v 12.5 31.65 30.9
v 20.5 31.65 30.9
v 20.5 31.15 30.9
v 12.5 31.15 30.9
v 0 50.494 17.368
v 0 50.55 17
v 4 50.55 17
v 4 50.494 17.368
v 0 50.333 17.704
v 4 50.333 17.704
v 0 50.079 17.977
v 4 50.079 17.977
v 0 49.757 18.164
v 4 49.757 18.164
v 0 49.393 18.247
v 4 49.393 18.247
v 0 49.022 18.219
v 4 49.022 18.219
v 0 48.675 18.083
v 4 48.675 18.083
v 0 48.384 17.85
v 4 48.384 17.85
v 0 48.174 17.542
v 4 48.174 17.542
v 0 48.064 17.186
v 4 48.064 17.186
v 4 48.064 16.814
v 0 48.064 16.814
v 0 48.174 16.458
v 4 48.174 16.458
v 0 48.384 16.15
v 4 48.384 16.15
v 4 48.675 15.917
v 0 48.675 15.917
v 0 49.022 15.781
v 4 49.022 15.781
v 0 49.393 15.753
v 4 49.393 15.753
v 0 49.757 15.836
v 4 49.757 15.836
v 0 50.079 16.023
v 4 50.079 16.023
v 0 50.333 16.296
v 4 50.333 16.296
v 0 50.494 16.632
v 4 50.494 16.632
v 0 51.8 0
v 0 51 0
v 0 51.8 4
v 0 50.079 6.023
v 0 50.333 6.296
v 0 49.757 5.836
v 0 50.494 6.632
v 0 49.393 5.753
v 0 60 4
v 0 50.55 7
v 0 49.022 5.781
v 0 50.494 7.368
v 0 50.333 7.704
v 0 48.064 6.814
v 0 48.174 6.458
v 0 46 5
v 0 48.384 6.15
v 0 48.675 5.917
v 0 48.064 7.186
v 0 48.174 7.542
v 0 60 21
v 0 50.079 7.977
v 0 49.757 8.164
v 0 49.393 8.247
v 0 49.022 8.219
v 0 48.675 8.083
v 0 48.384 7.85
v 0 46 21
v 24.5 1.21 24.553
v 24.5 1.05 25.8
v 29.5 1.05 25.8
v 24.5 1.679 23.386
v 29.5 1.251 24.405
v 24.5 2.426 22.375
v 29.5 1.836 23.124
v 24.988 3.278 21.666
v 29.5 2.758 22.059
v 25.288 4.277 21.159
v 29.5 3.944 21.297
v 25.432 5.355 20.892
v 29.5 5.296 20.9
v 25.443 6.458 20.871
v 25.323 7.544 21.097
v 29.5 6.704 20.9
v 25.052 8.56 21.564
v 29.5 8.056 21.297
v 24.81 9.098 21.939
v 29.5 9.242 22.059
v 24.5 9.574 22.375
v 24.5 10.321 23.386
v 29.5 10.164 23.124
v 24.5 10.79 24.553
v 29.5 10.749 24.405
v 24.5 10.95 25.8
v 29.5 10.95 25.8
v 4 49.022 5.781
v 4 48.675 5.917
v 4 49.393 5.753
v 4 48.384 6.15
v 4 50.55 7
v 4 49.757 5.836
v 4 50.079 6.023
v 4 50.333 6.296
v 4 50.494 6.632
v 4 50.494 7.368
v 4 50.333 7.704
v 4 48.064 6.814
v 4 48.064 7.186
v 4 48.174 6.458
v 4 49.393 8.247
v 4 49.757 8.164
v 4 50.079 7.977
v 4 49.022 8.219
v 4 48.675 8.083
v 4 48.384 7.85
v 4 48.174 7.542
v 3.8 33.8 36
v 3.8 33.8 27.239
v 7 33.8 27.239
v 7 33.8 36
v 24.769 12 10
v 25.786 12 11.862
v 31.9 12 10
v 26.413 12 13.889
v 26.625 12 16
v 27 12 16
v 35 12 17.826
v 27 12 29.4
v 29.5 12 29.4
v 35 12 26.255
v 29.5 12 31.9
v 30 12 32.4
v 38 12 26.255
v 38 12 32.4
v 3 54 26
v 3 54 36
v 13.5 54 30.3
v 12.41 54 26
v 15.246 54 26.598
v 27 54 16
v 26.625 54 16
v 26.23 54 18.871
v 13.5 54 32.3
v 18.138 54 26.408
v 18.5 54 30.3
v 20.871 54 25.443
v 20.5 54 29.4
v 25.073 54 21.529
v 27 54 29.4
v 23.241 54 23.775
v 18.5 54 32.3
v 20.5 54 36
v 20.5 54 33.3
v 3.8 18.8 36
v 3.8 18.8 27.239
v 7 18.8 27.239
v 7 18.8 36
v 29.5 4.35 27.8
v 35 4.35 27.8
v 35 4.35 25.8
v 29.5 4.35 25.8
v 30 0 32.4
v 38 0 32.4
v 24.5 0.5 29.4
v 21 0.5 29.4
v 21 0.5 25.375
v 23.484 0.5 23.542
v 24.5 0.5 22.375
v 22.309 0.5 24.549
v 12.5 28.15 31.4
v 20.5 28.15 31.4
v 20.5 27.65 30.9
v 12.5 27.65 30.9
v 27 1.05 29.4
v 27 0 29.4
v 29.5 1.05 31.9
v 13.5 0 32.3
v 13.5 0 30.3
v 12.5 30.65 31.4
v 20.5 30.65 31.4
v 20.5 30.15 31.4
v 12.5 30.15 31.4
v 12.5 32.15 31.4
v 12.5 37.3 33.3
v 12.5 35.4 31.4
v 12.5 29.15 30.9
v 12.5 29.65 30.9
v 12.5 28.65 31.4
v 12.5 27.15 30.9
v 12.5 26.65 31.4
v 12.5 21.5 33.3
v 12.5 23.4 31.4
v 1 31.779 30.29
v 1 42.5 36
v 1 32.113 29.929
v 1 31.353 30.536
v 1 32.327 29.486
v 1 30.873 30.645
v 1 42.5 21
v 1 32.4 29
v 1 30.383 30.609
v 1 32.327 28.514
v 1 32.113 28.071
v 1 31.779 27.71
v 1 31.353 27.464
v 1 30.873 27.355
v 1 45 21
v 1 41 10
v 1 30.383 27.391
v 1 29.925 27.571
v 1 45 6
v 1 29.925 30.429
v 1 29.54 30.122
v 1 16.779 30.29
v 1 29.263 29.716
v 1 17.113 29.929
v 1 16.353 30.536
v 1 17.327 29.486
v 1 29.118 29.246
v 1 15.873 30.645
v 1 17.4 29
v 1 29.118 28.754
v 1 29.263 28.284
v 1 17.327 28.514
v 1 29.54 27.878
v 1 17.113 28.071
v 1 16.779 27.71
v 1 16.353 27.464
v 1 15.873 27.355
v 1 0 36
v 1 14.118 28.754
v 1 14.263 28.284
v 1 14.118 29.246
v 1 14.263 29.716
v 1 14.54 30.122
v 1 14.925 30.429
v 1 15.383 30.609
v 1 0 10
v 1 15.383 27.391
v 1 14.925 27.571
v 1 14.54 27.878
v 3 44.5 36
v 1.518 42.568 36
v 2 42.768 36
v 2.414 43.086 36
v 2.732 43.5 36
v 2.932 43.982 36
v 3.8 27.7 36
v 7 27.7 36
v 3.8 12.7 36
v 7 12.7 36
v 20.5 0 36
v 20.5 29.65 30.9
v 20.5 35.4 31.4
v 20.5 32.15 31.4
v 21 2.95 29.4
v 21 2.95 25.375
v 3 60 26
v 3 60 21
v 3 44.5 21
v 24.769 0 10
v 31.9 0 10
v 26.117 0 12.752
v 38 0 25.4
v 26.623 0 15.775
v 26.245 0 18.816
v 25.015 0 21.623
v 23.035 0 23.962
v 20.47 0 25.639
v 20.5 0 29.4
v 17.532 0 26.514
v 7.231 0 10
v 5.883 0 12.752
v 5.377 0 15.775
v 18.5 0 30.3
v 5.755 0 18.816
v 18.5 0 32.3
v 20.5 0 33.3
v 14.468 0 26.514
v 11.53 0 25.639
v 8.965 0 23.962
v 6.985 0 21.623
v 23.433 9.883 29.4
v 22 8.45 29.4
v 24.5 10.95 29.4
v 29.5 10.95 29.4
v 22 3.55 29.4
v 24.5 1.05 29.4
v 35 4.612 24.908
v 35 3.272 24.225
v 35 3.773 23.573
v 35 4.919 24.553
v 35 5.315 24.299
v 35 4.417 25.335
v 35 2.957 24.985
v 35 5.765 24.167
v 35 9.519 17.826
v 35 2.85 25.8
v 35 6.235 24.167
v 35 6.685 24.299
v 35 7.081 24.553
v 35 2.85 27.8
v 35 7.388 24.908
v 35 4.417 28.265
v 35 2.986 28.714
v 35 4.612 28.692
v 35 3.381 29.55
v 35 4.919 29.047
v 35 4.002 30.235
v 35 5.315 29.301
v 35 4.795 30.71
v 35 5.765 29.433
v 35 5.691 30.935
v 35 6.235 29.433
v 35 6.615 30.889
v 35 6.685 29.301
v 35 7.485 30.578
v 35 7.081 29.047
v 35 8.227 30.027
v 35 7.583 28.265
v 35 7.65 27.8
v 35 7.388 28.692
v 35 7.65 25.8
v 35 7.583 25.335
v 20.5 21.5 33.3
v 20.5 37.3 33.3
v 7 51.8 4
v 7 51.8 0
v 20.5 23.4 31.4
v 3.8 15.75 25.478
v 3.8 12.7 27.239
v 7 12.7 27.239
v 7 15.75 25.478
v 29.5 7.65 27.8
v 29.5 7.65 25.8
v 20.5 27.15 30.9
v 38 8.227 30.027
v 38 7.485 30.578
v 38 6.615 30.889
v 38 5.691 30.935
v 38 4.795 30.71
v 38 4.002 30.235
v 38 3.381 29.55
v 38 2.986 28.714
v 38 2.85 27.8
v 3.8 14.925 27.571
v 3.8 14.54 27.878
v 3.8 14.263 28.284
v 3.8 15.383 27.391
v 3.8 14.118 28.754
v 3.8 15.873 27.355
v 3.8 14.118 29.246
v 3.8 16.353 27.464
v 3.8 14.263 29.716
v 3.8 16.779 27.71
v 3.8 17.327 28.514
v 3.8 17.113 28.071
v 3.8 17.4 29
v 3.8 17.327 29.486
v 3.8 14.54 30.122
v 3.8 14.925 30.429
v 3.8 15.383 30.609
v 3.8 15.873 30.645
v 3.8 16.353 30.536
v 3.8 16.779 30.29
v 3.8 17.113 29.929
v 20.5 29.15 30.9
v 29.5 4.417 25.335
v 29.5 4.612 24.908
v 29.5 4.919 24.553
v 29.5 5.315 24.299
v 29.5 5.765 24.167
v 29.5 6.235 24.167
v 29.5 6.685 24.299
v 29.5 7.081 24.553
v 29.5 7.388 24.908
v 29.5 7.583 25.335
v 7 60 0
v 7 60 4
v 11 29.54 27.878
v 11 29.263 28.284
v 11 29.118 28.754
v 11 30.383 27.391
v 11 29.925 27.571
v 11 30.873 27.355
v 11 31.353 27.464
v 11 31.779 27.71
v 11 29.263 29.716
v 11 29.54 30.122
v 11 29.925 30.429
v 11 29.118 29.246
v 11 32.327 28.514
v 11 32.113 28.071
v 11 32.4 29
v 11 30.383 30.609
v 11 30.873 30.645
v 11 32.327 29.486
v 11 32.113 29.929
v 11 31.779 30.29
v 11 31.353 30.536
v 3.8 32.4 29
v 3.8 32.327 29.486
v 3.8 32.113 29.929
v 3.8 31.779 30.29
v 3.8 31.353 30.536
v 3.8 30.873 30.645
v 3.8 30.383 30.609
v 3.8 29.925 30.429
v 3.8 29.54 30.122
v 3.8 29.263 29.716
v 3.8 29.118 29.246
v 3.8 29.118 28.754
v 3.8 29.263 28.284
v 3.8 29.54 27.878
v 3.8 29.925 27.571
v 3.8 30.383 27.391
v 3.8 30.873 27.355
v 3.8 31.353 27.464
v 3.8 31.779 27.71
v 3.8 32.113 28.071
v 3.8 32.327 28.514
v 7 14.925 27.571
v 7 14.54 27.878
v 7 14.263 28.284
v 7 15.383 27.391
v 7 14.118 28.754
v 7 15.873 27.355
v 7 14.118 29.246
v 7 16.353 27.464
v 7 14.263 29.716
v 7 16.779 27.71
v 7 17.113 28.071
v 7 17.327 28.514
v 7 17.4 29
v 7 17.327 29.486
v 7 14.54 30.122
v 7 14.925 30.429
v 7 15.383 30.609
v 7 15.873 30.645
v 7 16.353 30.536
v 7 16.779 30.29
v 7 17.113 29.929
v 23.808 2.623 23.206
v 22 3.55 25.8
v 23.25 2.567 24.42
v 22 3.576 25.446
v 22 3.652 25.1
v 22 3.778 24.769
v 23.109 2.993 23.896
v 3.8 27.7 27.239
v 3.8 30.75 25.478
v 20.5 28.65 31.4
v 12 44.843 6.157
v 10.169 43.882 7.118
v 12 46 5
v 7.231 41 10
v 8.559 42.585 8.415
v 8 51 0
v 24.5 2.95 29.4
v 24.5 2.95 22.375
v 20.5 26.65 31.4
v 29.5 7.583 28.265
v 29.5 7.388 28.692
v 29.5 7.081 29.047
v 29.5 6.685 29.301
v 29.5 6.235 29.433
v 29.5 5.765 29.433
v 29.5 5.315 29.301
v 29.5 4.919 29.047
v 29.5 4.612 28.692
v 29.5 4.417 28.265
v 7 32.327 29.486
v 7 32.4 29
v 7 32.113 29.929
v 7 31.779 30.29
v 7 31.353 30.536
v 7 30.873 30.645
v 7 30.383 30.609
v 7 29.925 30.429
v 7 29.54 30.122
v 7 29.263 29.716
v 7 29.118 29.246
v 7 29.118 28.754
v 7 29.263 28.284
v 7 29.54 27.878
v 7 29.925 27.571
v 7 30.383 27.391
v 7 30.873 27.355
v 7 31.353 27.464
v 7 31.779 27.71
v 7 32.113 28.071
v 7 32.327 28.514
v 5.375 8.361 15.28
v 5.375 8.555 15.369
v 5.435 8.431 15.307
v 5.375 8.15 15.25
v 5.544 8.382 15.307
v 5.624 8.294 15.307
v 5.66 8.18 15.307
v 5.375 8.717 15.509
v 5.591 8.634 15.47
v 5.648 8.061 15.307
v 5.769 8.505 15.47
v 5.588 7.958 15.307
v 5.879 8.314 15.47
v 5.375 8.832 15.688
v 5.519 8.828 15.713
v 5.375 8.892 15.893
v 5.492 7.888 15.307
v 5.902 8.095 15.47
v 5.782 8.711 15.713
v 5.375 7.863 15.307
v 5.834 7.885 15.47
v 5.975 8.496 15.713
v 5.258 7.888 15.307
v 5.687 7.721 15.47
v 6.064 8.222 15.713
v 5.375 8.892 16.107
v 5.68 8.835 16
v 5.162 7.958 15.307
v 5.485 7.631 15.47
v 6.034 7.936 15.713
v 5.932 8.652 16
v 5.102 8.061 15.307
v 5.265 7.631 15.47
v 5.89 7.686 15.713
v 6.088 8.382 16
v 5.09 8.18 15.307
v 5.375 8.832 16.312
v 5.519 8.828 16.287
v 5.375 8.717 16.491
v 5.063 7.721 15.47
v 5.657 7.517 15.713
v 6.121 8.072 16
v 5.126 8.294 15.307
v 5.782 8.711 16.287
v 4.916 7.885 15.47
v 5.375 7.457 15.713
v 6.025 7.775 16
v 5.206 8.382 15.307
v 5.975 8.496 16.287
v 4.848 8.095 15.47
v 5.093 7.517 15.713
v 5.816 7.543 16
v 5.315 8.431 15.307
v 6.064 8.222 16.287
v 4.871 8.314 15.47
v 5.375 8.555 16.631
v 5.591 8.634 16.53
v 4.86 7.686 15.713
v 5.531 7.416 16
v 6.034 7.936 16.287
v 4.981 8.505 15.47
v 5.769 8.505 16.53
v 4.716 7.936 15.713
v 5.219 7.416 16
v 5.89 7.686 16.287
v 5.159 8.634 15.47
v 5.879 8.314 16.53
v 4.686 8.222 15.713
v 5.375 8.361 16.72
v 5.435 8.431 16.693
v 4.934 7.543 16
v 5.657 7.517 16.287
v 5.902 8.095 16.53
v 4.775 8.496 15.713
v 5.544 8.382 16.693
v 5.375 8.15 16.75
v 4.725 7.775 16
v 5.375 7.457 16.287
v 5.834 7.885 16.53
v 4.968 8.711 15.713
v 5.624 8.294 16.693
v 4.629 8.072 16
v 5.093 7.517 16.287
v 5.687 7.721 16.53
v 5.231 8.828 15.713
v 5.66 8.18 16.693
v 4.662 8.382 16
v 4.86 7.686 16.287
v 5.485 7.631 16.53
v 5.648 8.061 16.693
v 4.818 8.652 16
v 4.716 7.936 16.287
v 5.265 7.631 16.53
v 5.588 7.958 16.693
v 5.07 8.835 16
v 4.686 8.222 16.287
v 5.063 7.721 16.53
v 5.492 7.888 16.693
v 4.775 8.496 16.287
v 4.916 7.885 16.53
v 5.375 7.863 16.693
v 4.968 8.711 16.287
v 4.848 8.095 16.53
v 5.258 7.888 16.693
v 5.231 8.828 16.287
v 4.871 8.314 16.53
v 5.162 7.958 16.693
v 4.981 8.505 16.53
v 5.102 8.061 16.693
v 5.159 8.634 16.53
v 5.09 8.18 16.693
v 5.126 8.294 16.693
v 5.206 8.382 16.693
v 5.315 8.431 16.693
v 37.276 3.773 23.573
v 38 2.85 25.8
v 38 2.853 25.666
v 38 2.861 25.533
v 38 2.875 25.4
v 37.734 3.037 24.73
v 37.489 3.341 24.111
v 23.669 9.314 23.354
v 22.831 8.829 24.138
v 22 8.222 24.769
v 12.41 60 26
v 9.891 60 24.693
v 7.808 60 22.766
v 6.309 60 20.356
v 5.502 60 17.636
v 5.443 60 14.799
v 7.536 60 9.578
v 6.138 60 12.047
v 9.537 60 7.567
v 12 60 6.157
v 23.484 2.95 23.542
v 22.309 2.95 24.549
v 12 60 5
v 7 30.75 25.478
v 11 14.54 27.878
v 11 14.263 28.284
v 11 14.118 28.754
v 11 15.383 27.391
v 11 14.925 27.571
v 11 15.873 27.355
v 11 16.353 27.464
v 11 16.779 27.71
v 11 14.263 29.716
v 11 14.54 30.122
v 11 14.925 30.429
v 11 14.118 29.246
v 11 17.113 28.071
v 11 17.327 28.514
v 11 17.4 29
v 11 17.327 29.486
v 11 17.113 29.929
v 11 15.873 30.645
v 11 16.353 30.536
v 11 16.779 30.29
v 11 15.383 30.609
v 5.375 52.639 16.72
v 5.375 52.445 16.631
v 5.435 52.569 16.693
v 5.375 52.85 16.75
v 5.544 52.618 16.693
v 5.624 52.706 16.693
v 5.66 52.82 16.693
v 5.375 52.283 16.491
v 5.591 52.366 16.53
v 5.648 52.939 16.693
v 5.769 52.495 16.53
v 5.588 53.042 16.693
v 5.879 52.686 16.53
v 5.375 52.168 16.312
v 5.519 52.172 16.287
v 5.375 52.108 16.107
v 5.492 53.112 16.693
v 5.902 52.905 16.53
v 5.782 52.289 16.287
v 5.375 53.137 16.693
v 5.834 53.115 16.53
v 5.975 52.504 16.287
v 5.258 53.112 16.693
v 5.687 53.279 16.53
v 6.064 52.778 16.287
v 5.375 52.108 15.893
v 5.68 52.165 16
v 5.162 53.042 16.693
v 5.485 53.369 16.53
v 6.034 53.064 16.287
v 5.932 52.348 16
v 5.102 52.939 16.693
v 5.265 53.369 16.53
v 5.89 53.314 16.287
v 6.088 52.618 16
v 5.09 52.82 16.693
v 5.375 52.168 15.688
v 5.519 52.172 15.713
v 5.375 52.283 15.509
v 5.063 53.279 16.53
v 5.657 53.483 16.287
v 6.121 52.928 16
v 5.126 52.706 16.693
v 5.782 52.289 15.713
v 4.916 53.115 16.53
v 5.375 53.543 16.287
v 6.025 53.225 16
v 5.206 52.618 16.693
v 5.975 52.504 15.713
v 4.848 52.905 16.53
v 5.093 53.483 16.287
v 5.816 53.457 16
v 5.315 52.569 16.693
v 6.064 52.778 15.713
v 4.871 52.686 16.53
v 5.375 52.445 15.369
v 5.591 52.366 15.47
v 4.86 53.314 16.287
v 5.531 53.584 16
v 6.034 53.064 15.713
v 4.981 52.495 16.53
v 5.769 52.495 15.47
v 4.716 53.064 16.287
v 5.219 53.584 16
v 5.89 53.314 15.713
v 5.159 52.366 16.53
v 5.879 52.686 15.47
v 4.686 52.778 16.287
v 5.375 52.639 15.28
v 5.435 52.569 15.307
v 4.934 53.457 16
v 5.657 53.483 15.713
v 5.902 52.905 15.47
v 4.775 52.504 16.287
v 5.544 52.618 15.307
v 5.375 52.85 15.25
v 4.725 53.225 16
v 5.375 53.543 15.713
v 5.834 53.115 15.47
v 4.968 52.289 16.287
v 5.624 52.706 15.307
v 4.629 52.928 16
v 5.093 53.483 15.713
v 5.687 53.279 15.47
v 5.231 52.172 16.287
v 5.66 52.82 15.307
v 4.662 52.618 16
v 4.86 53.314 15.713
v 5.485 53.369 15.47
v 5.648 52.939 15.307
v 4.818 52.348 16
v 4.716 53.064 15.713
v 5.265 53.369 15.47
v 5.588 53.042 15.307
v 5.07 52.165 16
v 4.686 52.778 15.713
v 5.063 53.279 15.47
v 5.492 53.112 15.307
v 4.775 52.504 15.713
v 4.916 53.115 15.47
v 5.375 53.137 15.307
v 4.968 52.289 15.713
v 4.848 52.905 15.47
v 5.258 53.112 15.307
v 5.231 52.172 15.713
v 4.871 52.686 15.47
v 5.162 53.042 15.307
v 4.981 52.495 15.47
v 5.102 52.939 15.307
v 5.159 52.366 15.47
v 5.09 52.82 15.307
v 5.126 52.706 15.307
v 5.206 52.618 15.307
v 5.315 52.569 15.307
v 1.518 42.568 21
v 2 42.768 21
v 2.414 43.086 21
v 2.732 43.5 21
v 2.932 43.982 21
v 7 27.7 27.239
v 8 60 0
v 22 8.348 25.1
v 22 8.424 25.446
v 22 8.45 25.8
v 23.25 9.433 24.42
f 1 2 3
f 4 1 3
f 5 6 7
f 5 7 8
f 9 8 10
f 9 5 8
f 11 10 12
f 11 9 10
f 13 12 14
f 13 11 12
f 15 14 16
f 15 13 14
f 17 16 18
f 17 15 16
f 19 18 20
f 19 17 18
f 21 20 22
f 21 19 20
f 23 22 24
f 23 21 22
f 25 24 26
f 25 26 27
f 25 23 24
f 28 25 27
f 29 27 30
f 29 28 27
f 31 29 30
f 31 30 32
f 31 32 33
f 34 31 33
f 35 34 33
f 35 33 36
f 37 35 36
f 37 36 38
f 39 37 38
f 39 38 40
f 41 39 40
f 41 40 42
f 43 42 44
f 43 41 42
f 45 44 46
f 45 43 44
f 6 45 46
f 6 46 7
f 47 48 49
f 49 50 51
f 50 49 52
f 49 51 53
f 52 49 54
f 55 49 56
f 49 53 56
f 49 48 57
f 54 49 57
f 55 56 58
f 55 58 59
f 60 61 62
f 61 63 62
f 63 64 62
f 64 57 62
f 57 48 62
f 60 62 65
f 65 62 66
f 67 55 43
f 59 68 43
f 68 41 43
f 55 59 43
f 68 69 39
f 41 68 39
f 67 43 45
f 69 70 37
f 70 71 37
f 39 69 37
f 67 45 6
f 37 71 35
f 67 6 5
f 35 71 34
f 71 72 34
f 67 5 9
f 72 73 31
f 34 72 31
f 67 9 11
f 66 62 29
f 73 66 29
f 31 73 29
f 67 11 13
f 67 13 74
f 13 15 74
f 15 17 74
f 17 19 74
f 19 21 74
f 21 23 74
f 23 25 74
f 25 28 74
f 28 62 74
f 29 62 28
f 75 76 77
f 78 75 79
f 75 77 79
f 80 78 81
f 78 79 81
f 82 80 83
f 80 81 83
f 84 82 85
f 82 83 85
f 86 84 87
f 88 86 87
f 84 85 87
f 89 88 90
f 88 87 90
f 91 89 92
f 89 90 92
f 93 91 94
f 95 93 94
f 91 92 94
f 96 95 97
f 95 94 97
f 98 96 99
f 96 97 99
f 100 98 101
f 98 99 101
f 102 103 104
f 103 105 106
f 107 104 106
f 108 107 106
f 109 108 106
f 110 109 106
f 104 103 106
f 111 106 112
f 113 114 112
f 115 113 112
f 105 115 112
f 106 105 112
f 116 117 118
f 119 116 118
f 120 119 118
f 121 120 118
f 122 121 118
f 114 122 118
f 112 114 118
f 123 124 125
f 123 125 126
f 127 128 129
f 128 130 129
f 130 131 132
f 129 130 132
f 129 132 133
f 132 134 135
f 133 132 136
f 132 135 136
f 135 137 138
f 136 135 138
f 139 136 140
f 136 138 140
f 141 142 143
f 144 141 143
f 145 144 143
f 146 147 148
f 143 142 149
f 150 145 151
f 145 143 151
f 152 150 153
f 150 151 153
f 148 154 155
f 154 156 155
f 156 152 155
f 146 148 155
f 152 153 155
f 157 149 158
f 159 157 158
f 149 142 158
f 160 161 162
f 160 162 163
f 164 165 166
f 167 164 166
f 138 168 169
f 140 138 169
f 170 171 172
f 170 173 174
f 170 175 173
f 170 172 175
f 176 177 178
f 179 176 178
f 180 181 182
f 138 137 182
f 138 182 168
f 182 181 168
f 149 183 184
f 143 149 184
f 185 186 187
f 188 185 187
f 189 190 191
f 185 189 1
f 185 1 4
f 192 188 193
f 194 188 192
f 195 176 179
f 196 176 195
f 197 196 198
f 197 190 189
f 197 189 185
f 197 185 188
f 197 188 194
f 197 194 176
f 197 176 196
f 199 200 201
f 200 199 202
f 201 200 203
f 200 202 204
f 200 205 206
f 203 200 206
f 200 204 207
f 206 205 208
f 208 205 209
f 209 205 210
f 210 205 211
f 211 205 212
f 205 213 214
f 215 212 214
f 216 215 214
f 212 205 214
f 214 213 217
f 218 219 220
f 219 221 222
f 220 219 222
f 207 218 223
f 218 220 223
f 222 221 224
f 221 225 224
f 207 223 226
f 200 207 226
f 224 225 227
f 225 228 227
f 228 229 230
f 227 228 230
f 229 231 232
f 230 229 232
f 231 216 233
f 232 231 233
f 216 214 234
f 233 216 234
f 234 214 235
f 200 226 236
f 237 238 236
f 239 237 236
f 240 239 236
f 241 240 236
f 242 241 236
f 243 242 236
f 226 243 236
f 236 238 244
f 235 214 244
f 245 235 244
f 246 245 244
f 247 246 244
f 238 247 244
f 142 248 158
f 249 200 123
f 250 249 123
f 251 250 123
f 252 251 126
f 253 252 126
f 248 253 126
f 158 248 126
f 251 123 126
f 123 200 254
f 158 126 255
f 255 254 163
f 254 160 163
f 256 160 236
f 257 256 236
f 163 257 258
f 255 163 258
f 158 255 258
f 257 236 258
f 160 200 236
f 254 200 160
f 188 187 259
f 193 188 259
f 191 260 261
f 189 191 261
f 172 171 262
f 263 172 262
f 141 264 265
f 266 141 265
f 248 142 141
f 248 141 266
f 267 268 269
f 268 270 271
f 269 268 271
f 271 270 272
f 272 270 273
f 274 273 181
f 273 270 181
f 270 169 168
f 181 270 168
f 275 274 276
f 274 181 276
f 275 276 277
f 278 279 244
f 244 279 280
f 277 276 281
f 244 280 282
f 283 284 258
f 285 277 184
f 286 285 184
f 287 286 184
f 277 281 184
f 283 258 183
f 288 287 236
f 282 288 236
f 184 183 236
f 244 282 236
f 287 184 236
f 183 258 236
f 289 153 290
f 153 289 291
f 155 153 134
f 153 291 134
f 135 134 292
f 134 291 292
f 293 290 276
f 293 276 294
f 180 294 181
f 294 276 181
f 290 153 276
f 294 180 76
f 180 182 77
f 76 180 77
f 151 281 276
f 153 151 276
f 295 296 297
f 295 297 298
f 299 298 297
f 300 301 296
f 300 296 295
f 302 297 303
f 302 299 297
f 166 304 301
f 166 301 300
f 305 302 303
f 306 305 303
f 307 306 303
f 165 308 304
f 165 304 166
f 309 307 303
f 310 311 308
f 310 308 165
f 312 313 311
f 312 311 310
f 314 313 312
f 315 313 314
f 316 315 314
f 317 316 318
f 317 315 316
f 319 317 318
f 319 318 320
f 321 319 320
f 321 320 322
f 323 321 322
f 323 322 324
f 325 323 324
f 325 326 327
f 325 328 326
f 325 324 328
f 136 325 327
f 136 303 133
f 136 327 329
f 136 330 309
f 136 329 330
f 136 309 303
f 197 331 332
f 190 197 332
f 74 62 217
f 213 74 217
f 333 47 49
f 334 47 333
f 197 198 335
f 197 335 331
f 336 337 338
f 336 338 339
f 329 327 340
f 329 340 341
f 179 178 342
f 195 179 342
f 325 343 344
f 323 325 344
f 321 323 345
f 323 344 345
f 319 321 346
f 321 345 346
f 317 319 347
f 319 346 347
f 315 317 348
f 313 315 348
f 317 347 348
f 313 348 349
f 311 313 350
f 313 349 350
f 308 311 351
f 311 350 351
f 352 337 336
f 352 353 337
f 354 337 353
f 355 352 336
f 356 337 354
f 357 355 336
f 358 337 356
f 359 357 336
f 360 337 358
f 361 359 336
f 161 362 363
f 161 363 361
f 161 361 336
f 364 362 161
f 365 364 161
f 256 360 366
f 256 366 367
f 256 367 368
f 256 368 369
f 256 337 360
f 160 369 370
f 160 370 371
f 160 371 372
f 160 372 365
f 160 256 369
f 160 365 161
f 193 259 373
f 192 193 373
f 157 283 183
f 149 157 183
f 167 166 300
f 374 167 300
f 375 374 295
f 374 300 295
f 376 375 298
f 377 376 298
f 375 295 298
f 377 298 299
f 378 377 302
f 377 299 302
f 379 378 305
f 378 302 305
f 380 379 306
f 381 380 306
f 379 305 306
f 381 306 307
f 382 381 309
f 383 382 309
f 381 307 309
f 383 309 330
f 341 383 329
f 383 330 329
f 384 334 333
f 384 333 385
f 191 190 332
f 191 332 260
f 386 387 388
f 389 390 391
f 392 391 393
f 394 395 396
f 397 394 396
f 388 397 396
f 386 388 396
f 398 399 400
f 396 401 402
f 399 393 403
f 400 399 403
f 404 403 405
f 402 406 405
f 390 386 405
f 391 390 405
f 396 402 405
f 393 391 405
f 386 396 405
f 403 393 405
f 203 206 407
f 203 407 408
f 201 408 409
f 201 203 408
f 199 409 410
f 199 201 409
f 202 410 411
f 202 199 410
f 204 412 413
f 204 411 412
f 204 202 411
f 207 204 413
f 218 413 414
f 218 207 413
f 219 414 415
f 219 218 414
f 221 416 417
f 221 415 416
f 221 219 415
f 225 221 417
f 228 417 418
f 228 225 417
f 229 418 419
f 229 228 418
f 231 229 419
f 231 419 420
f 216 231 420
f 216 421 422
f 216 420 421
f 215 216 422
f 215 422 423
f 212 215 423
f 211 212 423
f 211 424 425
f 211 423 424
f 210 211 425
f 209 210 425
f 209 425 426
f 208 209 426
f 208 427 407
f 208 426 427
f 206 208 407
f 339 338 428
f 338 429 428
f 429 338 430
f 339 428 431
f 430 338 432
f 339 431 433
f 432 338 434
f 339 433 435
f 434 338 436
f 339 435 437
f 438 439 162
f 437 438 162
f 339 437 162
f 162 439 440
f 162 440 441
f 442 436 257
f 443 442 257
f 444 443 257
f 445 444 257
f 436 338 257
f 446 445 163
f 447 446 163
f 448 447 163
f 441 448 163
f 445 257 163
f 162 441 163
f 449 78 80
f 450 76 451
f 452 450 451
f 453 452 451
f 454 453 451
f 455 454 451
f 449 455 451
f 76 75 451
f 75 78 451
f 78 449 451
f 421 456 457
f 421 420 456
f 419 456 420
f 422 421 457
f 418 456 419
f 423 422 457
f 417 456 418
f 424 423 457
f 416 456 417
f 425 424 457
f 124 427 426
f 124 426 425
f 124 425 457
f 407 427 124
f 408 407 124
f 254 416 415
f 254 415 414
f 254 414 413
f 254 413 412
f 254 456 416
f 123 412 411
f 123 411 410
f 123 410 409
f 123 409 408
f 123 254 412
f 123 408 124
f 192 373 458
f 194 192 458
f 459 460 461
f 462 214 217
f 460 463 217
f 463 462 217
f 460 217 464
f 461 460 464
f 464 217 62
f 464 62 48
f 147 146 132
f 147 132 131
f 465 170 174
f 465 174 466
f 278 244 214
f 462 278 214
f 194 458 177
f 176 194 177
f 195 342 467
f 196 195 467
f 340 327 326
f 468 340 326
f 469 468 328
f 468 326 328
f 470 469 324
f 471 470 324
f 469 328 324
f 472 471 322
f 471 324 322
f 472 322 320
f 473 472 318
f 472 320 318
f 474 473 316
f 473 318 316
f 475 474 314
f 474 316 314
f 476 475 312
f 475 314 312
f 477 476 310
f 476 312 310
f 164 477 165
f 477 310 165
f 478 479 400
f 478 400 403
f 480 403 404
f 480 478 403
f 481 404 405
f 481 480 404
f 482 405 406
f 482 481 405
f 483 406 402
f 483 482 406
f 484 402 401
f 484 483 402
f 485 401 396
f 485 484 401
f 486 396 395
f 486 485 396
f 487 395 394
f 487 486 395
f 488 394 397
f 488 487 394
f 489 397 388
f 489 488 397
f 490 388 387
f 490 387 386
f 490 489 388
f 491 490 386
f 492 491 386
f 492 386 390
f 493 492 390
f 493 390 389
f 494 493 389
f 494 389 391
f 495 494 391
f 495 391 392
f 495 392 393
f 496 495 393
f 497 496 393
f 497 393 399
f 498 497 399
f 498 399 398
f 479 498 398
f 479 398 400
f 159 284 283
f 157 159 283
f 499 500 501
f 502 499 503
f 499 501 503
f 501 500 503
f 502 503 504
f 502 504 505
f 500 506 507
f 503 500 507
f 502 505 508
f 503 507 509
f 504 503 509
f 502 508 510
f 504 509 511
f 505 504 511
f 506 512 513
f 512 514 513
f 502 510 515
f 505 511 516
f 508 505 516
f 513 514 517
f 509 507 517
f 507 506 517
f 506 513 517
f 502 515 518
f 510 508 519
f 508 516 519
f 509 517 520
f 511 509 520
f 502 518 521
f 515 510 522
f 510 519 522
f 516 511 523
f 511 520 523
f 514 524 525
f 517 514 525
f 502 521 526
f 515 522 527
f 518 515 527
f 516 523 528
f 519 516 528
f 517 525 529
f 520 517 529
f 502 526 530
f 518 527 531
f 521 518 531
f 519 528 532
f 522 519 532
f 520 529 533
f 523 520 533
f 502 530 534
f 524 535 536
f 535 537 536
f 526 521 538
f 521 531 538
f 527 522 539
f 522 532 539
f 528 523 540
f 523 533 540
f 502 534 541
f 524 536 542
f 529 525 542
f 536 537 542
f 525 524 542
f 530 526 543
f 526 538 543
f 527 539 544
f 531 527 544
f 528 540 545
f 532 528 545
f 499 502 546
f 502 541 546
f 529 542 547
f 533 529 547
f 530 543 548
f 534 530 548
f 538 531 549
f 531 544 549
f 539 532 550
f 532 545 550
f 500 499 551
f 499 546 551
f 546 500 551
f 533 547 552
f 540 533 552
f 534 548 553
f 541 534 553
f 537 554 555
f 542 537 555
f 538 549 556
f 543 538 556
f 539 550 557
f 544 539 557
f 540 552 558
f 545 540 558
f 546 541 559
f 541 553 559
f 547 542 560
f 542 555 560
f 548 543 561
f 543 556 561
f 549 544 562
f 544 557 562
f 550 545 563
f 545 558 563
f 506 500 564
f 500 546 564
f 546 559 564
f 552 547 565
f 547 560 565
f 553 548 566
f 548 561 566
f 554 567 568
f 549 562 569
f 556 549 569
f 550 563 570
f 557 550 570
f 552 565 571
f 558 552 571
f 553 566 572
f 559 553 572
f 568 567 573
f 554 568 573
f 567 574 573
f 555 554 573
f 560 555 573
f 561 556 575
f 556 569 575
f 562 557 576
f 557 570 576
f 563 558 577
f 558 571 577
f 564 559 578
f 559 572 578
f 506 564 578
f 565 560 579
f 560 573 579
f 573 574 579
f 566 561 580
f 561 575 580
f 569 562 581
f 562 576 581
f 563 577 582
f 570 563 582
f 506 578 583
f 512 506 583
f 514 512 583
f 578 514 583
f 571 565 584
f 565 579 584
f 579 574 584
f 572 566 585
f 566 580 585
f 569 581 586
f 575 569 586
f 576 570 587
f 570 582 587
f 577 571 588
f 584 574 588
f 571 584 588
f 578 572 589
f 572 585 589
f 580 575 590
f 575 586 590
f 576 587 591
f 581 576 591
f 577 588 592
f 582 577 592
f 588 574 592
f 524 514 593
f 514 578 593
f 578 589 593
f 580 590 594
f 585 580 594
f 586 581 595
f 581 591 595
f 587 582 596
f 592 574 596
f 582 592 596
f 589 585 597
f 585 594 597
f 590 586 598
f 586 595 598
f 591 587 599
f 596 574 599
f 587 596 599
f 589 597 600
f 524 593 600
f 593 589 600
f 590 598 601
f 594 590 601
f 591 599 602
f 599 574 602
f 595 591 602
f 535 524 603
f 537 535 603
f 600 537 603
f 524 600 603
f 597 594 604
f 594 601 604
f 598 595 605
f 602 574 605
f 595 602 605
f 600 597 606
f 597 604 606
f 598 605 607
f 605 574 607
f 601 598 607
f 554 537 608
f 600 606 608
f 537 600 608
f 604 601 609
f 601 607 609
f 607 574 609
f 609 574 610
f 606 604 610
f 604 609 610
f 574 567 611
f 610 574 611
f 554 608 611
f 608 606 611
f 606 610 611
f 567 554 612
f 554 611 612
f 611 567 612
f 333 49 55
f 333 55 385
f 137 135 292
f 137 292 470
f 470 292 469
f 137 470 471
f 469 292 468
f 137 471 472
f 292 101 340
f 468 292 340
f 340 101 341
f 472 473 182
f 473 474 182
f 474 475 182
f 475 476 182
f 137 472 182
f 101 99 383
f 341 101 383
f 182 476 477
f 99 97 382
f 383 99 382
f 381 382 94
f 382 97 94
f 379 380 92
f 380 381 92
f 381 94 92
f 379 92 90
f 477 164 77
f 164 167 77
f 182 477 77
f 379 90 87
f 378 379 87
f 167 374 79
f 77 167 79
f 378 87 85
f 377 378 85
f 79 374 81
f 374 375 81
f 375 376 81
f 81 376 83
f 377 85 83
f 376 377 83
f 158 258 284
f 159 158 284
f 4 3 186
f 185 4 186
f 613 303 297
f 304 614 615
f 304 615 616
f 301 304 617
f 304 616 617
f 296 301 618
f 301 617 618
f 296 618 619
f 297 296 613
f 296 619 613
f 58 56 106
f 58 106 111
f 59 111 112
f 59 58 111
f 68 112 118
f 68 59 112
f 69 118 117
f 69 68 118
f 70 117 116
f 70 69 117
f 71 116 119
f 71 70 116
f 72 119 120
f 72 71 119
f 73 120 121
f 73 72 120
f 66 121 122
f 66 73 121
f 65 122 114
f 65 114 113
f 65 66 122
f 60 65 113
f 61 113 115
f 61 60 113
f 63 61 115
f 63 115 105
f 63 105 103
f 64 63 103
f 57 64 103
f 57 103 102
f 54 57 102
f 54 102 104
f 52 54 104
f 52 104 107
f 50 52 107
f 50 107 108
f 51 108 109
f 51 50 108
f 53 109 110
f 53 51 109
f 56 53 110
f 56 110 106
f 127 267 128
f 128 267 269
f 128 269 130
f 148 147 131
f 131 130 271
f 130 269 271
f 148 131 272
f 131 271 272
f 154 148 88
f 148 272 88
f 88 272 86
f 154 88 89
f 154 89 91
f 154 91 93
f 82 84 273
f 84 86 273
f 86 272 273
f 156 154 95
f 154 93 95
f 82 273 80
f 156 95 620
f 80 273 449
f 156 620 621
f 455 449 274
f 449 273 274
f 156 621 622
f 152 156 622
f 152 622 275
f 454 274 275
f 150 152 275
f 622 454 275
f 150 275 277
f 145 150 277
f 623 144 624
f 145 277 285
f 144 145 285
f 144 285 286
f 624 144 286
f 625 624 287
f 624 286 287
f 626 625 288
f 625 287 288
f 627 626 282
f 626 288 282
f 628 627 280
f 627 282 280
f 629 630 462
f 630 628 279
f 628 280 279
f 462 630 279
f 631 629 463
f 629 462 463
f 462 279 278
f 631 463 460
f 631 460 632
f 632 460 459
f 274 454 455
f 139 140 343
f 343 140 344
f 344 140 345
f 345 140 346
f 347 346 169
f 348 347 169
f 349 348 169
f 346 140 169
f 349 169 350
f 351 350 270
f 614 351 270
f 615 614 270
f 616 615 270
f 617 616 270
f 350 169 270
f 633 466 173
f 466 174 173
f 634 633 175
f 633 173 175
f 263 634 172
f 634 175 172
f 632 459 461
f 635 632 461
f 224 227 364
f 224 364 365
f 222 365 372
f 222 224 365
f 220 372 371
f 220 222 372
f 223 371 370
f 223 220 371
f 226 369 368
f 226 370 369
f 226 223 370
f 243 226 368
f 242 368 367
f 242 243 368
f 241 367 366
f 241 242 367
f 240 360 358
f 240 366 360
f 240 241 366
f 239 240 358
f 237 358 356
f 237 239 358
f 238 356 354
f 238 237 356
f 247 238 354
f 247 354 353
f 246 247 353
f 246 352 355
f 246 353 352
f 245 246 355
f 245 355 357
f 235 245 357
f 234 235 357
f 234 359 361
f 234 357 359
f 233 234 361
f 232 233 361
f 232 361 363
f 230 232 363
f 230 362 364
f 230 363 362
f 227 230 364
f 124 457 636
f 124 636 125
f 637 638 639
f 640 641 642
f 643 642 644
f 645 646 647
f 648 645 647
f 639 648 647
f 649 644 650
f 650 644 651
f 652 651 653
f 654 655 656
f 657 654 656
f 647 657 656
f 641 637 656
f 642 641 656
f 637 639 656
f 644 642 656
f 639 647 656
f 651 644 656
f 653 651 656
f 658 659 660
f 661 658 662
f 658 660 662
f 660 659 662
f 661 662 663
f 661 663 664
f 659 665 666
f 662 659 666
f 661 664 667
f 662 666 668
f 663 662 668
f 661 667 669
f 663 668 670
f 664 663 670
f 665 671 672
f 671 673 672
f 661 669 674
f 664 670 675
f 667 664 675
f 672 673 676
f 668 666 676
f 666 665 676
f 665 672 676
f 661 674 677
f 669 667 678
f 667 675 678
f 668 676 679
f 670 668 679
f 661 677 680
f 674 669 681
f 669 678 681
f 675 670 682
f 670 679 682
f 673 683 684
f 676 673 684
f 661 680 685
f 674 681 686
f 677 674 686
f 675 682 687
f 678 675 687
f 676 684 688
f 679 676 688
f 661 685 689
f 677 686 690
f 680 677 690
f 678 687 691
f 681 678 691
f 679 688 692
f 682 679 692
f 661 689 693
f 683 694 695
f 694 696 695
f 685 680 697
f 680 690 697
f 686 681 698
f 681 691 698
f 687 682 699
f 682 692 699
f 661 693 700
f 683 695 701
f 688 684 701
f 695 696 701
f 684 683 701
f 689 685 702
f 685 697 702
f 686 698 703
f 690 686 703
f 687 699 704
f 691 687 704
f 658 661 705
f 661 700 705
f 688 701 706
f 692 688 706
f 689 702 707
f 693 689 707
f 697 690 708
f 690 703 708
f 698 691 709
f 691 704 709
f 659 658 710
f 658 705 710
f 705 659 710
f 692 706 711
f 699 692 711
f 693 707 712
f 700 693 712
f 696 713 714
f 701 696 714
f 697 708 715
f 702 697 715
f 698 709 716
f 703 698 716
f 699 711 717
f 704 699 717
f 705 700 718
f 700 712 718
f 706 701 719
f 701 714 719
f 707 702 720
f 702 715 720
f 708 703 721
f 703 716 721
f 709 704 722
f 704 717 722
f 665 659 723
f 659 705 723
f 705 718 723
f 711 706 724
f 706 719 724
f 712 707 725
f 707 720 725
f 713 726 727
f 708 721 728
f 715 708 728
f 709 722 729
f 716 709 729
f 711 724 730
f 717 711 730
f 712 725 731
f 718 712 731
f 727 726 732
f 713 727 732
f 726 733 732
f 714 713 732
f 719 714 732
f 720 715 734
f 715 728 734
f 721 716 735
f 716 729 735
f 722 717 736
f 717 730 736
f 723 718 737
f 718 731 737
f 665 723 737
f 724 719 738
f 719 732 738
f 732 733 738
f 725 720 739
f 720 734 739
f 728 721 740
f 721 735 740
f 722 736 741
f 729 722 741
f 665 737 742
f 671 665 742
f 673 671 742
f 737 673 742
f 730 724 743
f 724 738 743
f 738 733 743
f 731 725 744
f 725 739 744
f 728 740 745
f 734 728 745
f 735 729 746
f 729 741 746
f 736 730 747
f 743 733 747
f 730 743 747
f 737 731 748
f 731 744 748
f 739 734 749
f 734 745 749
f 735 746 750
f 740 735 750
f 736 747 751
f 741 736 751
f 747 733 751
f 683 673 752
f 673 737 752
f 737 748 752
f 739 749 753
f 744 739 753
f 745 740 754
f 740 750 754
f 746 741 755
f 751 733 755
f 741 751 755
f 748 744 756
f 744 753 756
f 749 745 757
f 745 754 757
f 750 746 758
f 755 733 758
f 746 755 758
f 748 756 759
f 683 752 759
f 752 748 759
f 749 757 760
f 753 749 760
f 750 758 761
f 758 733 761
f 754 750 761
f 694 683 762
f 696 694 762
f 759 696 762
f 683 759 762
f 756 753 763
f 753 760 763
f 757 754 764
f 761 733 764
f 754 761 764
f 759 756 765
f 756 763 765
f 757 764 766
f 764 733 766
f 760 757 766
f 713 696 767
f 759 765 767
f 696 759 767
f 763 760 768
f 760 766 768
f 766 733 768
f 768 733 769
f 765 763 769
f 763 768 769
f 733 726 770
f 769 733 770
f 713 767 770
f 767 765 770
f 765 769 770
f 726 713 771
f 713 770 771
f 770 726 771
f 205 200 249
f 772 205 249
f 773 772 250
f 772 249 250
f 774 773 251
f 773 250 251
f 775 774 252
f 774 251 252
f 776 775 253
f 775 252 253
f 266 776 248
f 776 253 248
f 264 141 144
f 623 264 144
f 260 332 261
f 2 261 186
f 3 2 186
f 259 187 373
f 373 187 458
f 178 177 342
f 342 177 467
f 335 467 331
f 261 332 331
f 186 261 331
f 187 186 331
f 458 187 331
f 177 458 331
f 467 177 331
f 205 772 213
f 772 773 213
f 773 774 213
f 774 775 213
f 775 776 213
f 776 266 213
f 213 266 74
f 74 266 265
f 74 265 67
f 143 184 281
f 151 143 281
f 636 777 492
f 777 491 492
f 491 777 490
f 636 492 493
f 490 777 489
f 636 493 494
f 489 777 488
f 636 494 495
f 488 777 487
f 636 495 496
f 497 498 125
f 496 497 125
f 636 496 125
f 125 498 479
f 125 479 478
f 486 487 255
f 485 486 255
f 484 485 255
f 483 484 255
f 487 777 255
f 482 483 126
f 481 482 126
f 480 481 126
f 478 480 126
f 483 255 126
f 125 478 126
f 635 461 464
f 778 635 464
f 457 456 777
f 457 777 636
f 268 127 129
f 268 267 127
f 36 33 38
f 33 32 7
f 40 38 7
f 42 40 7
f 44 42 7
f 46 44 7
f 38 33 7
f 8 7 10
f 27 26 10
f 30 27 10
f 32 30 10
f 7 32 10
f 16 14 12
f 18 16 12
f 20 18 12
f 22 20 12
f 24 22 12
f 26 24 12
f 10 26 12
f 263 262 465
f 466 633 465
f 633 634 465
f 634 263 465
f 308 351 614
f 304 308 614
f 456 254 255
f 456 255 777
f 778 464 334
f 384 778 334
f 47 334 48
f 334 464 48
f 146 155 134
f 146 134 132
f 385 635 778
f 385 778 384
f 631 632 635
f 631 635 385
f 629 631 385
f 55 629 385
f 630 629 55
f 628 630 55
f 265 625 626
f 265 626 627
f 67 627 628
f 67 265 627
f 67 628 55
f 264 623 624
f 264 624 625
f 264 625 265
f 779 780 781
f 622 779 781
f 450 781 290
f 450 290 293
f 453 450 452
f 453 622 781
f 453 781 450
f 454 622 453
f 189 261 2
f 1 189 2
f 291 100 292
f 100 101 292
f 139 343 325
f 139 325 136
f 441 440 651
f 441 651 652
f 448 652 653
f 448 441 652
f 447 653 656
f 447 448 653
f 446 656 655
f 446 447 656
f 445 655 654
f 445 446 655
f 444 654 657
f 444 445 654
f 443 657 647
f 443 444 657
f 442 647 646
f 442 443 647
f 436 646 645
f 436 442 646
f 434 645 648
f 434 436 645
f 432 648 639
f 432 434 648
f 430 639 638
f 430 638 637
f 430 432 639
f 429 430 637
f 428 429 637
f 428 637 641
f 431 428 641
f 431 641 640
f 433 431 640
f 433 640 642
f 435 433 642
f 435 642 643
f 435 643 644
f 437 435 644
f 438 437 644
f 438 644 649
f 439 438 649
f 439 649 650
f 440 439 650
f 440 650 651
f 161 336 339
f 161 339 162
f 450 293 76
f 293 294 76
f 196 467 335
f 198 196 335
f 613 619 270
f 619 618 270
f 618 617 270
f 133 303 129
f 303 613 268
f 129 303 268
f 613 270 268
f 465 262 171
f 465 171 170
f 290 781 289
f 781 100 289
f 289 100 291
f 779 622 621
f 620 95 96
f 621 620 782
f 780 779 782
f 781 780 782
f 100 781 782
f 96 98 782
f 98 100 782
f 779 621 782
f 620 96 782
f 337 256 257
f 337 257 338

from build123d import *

# Parameters (mm, degrees)
PAD_DEPTH       = 60
POCKET_DEPTH    = 36.001
POCKET001_DEPTH = 38.001
POCKET002_DEPTH = 6
POCKET003_DEPTH = 48
POCKET004_DEPTH = 15
SKETCH006_W     = 7
SKETCH006_H     = 8.2
POCKET005_DEPTH = 4
POCKET006_DEPTH = 3.2
SKETCH011_R     = 1.25
POCKET007_DEPTH = 4
SKETCH012_R     = 1.65
POCKET008_DEPTH = 11
POCKET009_DEPTH = 3
POCKET010_DEPTH = 11
POCKET011_DEPTH = 60.001
PAD001_DEPTH    = 8
SKETCH017_W     = 3.5
SKETCH017_H     = 2.45
PAD002_DEPTH    = 13.4
SKETCH018_R     = 10.625
POCKET012_DEPTH = 2.951


with BuildPart() as main_body:
    # Sketch → Pad (new body)
    with BuildSketch(Plane.XZ):
        with BuildLine():
            ThreePointArc((24.76873, 10), (12.937657, 26.174118), (12, 6.156696))
            Line((12, 6.156696), (12, 5))
            Line((12, 5), (8, 0))
            Line((8, 0), (0, 0))
            Line((0, 0), (0, 36))
            Line((0, 36), (20.5, 36))
            Line((20.5, 36), (20.5, 32.3))
            Line((20.5, 32.3), (13.5, 32.3))
            Line((13.5, 32.3), (13.5, 30.3))
            Line((13.5, 30.3), (20.5, 30.3))
            Line((20.5, 30.3), (20.5, 29.4))
            Line((20.5, 29.4), (27, 29.4))
            Line((27, 29.4), (30, 32.4))
            Line((30, 32.4), (38, 32.4))
            Line((38, 32.4), (38, 25.4))
            Line((38, 25.4), (31.9, 10))
            Line((24.76873, 10), (31.9, 10))
        make_face()
    extrude(amount=-PAD_DEPTH)

    # Sketch001 → Pocket (cut, through all)
    with BuildSketch(Plane.XY):
        Polygon((0, 46), (1, 45), (1, 0), (0, 0), align=None)
    extrude(amount=POCKET_DEPTH, mode=Mode.SUBTRACT)

    # Sketch002 → Pocket001 (cut, through all)
    with BuildSketch(Plane.YZ):
        Polygon((0, 10), (41, 10), (51, 0), (0, 0), align=None)
    extrude(amount=POCKET001_DEPTH, mode=Mode.SUBTRACT)

    # Sketch003 → Pocket002 (cut)
    with BuildSketch(Plane.XZ.offset(-54)):
        Polygon((0, 36), (0, 26), (12.5, 26), (12.5, 0), (38, 0), (38, 36), align=None)
    extrude(amount=-POCKET002_DEPTH, mode=Mode.SUBTRACT)

    # Sketch004 → Pocket003 (cut)
    with BuildSketch(Plane.XZ.offset(-60)):
        Polygon((27, 36), (27, 16), (16, 16), (16, 0), (38, 0), (38, 36), align=None)
    extrude(amount=POCKET003_DEPTH, mode=Mode.SUBTRACT)

    # Sketch005 → Pocket004 (cut)
    with BuildSketch(Plane.XY.offset(36)):
        with BuildLine():
            Line((-1, 60), (3, 60))
            Line((3, 60), (3, 44.5))
            ThreePointArc((-1, 44.5), (1, 42.5), (3, 44.5))
            Line((-1, 60), (-1, 44.5))
        make_face()
    extrude(amount=-POCKET004_DEPTH, mode=Mode.SUBTRACT)

    # Sketch006 → Pocket005 (cut)
    with BuildSketch(Plane.XY):
        with Locations((3.5, 55.9)):
            Rectangle(SKETCH006_W, SKETCH006_H)
    extrude(amount=POCKET005_DEPTH, mode=Mode.SUBTRACT)

    # Sketch009 → SubtractiveLoft section 0
    with BuildSketch(Plane.YZ.offset(22)):
        with BuildLine():
            ThreePointArc((3.55, 25.8), (6, 23.35), (8.45, 25.8))
            Line((8.45, 32.73), (8.45, 25.8))
            Line((8.45, 32.73), (12, 32.73))
            Line((12, 32.73), (12, 36))
            Line((3.55, 36), (12, 36))
            Line((3.55, 25.8), (3.55, 36))
        make_face()
    # Sketch008 → SubtractiveLoft section 1
    with BuildSketch(Plane.YZ.offset(24.5)):
        with BuildLine():
            ThreePointArc((1.05, 25.8), (6, 20.85), (10.95, 25.8))
            Line((10.95, 29.4), (10.95, 25.8))
            Line((10.95, 29.4), (12, 29.4))
            Line((12, 29.4), (12, 36))
            Line((1.05, 36), (12, 36))
            Line((1.05, 25.8), (1.05, 36))
        make_face()
    # Sketch007 → SubtractiveLoft section 2
    with BuildSketch(Plane.YZ.offset(29.5)):
        with BuildLine():
            ThreePointArc((1.05, 25.8), (6, 20.85), (10.95, 25.8))
            Line((10.95, 29.4), (10.95, 25.8))
            Line((10.95, 29.4), (12, 29.4))
            Line((12, 29.4), (12, 36))
            Line((1.05, 36), (12, 36))
            Line((1.05, 25.8), (1.05, 36))
        make_face()
    loft(ruled=True, mode=Mode.SUBTRACT)

    # Sketch010 → Pocket006 (cut)
    with BuildSketch(Plane.YZ.offset(3.8)):
        Polygon((12.7, 30.760918), (12.7, 27.239082), (15.75, 25.478163), (18.8, 27.239082), (18.8, 30.760918), (18.8, 36), (12.7, 36), align=None)
        Polygon((27.7, 30.760918), (27.7, 27.239082), (30.75, 25.478163), (33.8, 27.239082), (33.8, 30.760918), (33.8, 36), (27.7, 36), align=None)
    extrude(amount=POCKET006_DEPTH, mode=Mode.SUBTRACT)

    # Sketch011 → Pocket007 (cut)
    with BuildSketch(Plane.YZ):
        with Locations((49.3, 17)):
            Circle(SKETCH011_R)
        with Locations((49.3, 7)):
            Circle(SKETCH011_R)
    extrude(amount=POCKET007_DEPTH, mode=Mode.SUBTRACT)

    # Sketch012 → Pocket008 (cut)
    with BuildSketch(Plane.YZ):
        with Locations((15.75, 29)):
            Circle(SKETCH012_R)
        with Locations((30.75, 29)):
            Circle(SKETCH012_R)
    extrude(amount=POCKET008_DEPTH, mode=Mode.SUBTRACT)

    # Sketch013 → Pocket009 (cut)
    with BuildSketch(Plane.YZ.offset(38)):
        with BuildLine():
            ThreePointArc((8.227386, 30.027386), (4.794547, 30.710221), (2.85, 27.8))
            Line((2.85, 27.8), (2.85, 25.8))
            ThreePointArc((2.85, 25.8), (3.089779, 24.594547), (3.772614, 23.572614))
            Line((12, 15.345227), (3.772614, 23.572614))
            Line((12, 26.254773), (12, 15.345227))
            Line((8.227386, 30.027386), (12, 26.254773))
        make_face()
    extrude(amount=-POCKET009_DEPTH, mode=Mode.SUBTRACT)

    # Sketch014 → Pocket010 (cut)
    with BuildSketch(Plane.YZ.offset(38)):
        with BuildLine():
            ThreePointArc((7.65, 27.8), (6, 29.45), (4.35, 27.8))
            Line((4.35, 27.8), (4.35, 25.8))
            ThreePointArc((4.35, 25.8), (6, 24.15), (7.65, 25.8))
            Line((7.65, 27.8), (7.65, 25.8))
        make_face()
    extrude(amount=-POCKET010_DEPTH, mode=Mode.SUBTRACT)

    # Sketch015 → Pocket011 (cut, through all)
    with BuildSketch(Plane.XZ):
        Polygon((20.5, 33.3), (17.5, 31.8), (17.5, 30.75), (20.5, 29.4), align=None)
    extrude(amount=-POCKET011_DEPTH, mode=Mode.SUBTRACT)


with BuildPart() as belt_gripper:
    # Sketch016 → Pad001 (new body)
    with BuildSketch(Plane.YZ.offset(20.5)):
        Polygon((21.5, 33.3), (37.3, 33.3), (35.4, 31.4), (32.15, 31.4), (31.65, 30.9), (31.15, 30.9), (30.65, 31.4), (30.15, 31.4), (29.65, 30.9), (29.15, 30.9), (28.65, 31.4), (28.15, 31.4), (27.65, 30.9), (27.15, 30.9), (26.65, 31.4), (23.4, 31.4), align=None)
    extrude(amount=-PAD001_DEPTH)


with BuildPart() as xrib_bearing_nut_stop:
    # Sketch017 → Pad002 (new body)
    with BuildSketch(Plane.XY.offset(29.4)):
        with Locations((22.75, 1.725)):
            Rectangle(SKETCH017_W, SKETCH017_H)
    extrude(amount=-PAD002_DEPTH)

    # Sketch018 → Pocket012 (cut, through all)
    with BuildSketch(Plane.XZ):
        with Locations((16, 16)):
            Circle(SKETCH018_R)
    extrude(amount=-POCKET012_DEPTH, mode=Mode.SUBTRACT)


with BuildPart() as body003:
    # Sketch019 → Revolution (revolve)
    with BuildSketch(Plane.YZ.offset(5.375)):
        with BuildLine():
            ThreePointArc((8.15, 15.25), (8.9, 16), (8.15, 16.75))
            Line((8.15, 16.75), (8.15, 15.25))
        make_face()
    revolve(axis=Axis((5.375, 8.15, 16.75), (0, 0, -1)))


with BuildPart() as body004:
    # Sketch020 → Revolution001 (revolve)
    with BuildSketch(Plane.YZ.offset(5.375)):
        with BuildLine():
            ThreePointArc((52.85, 16.75), (52.1, 16), (52.85, 15.25))
            Line((52.85, 15.25), (52.85, 16.75))
        make_face()
    revolve(axis=Axis((5.375, 52.85, 15.25), (0, 0, 1)))


solid = Compound([main_body.part, belt_gripper.part, xrib_bearing_nut_stop.part, body003.part, body004.part])
